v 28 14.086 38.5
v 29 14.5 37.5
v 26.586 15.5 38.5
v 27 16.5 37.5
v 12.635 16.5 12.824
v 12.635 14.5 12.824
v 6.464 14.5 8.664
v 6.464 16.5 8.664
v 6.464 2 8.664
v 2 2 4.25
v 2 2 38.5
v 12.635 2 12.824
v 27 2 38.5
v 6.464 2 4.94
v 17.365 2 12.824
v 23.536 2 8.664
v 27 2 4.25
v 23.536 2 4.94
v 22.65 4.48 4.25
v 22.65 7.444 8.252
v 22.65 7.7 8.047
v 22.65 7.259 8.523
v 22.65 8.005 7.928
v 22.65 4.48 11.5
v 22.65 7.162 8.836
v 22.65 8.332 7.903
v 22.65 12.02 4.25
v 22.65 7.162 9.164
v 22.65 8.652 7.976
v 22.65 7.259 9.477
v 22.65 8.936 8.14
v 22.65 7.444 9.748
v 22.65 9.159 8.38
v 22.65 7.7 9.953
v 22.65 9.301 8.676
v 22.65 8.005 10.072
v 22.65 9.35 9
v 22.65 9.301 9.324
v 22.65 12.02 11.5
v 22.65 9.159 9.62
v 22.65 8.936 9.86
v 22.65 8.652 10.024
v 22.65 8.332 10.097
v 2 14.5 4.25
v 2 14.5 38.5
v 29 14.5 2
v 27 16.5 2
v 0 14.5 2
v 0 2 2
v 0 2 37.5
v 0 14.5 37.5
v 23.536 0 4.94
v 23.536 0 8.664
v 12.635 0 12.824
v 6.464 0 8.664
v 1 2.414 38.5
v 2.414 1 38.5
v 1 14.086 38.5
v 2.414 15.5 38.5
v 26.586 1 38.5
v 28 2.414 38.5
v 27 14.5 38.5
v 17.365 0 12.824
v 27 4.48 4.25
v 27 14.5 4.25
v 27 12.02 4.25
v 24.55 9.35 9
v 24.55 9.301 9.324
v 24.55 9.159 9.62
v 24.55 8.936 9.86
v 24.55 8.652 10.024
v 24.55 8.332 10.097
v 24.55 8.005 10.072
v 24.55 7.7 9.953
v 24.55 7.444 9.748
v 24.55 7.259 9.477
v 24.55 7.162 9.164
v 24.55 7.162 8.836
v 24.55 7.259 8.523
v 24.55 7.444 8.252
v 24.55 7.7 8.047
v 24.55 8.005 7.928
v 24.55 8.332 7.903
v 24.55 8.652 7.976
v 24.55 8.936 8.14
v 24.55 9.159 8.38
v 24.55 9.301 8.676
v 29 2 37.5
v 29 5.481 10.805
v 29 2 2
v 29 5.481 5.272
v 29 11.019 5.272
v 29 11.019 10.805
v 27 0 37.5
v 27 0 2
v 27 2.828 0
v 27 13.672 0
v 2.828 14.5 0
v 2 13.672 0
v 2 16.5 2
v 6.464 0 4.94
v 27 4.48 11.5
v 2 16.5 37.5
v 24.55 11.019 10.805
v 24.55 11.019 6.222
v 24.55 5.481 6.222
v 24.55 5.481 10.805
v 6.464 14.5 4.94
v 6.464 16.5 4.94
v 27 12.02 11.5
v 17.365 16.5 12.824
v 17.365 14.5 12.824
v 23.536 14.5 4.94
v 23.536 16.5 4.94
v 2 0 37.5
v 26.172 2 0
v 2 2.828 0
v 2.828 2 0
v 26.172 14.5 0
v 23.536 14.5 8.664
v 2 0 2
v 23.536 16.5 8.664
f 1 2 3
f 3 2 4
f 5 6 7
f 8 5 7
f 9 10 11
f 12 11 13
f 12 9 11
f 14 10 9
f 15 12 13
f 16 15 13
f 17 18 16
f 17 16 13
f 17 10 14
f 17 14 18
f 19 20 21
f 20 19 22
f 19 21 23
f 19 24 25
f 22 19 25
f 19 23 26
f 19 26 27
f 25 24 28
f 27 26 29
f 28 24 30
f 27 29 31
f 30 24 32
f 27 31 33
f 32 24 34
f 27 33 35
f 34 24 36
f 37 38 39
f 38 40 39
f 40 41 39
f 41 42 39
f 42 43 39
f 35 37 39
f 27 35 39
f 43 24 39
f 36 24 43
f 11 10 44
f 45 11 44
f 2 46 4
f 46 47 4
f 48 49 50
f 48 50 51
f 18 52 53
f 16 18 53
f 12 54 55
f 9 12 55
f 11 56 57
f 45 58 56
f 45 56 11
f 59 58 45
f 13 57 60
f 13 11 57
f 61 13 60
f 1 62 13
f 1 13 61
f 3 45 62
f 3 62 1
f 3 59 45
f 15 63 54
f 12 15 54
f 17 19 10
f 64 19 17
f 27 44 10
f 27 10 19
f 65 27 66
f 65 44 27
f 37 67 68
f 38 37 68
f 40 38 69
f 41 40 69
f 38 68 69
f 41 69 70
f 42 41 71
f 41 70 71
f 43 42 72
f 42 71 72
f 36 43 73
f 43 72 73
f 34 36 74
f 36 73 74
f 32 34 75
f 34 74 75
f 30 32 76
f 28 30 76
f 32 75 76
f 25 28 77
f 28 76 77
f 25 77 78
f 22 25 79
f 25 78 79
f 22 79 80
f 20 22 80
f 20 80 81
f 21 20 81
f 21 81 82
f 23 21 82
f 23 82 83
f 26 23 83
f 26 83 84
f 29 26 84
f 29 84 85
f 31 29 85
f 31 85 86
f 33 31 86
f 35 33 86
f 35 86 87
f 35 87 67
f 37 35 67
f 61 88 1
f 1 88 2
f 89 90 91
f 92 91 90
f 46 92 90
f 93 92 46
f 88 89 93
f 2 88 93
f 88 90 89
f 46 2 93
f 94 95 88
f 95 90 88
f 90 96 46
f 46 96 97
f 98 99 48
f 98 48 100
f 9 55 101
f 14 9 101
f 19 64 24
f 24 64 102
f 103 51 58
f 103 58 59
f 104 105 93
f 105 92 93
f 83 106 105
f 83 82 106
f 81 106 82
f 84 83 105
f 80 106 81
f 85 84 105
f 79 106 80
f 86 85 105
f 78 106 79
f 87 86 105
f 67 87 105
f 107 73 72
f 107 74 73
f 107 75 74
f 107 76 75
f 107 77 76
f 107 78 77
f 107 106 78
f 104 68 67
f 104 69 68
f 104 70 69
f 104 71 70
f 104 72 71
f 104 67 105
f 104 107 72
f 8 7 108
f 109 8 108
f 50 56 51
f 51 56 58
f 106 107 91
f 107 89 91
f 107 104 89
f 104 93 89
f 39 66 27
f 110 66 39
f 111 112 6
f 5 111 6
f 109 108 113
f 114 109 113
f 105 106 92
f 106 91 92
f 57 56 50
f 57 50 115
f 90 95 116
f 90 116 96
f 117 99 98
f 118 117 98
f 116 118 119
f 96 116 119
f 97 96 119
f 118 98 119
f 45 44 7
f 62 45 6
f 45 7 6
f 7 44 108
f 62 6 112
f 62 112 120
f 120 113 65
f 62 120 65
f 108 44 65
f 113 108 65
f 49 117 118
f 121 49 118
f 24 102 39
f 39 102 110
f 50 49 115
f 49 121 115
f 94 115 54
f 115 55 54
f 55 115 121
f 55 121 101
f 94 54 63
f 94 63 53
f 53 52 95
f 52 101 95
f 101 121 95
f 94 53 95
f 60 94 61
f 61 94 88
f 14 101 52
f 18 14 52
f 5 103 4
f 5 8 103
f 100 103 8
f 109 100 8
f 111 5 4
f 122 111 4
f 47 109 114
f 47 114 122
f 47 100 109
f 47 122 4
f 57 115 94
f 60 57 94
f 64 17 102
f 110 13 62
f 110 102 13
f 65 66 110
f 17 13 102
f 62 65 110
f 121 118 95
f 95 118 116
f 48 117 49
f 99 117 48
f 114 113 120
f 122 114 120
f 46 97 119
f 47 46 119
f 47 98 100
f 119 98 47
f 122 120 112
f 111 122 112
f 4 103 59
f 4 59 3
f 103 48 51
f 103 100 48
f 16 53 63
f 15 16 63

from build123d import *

# Parameters (mm, degrees)
F0_W      = 29
F0_H      = 16.5
F1_DEPTH  = 38.5
F2_T      = -2
F3_DEPTH  = 2.25
F4_SIZE   = 2
F5_SIZE   = 2
F6_SIZE   = 1
F8_DEPTH  = 16.501
F9_W      = 7.54
F9_H      = 7.25
F9_R      = 1.1
F10_DEPTH = 6.35
F13_W     = 5.538
F13_H     = 4.583
F11_W     = 5.538
F11_H     = 5.533


with BuildPart() as f1:
    # F0 (on Top) → F1 (new body)
    with BuildSketch(Plane.XY):
        with Locations((14.5, 8.25)):
            Rectangle(F0_W, F0_H)
    extrude(amount=F1_DEPTH)

    # F2
    f2_openings = [f1.faces().sort_by_distance(p)[0] for p in [
        (14.5, 8.25, 38.5),
    ]]
    offset(amount=F2_T, openings=f2_openings)

    # F3 (add): a face of the model
    f3_faces = [f1.faces().sort_by_distance(p)[0] for p in [
        (14.5, 8.25, 2),
    ]]
    extrude(f3_faces, amount=F3_DEPTH)

    # F4
    f4_edges = [f1.edges().sort_by_distance(p)[0] for p in [
        (29, 0, 19.25),
        (29, 16.5, 19.25),
        (0, 16.5, 19.25),
        (0, 0, 19.25),
    ]]
    chamfer(f4_edges, length=F4_SIZE)

    # F5
    f5_edges = [f1.edges().sort_by_distance(p)[0] for p in [
        (0, 8.25, 0),
        (1, 15.5, 0),
        (1, 1, 0),
        (14.5, 16.5, 0),
        (14.5, 0, 0),
        (28, 15.5, 0),
        (28, 1, 0),
        (29, 8.25, 0),
    ]]
    chamfer(f5_edges, length=F5_SIZE)

    # F6
    f6_edges = [f1.edges().sort_by_distance(p)[0] for p in [
        (0, 8.25, 38.5),
        (1, 1, 38.5),
        (14.5, 0, 38.5),
        (28, 1, 38.5),
        (29, 8.25, 38.5),
        (28, 15.5, 38.5),
        (14.5, 16.5, 38.5),
        (1, 15.5, 38.5),
    ]]
    chamfer(f6_edges, length=F6_SIZE)

    # F7 (on face) → F8 (cut, through all)
    with BuildSketch(Plane.XZ):
        Polygon((23.536, 8.664), (17.365, 12.824), (12.635, 12.824), (6.464, 8.664), (6.464, 4.94), (23.536, 4.94), align=None)
    extrude(amount=-F8_DEPTH, mode=Mode.SUBTRACT)

    # F9 (on face) → F10 (join)
    with BuildSketch(Plane.YZ.offset(29)):
        with Locations((8.25, 7.875)):
            Rectangle(F9_W, F9_H)
        with Locations((8.25, 9)):
            Circle(F9_R, mode=Mode.SUBTRACT)
    extrude(amount=-F10_DEPTH)

    # F13 (on offset) → F14 section 0
    with BuildSketch(Plane.YZ.offset(24.55)):
        with Locations((8.25, 8.5135)):
            Rectangle(F13_W, F13_H)
    # F11 (on face) → F14 section 1
    with BuildSketch(Plane.YZ.offset(29)):
        with Locations((8.25, 8.0385)):
            Rectangle(F11_W, F11_H)
    loft(mode=Mode.SUBTRACT)


solid = f1.part
